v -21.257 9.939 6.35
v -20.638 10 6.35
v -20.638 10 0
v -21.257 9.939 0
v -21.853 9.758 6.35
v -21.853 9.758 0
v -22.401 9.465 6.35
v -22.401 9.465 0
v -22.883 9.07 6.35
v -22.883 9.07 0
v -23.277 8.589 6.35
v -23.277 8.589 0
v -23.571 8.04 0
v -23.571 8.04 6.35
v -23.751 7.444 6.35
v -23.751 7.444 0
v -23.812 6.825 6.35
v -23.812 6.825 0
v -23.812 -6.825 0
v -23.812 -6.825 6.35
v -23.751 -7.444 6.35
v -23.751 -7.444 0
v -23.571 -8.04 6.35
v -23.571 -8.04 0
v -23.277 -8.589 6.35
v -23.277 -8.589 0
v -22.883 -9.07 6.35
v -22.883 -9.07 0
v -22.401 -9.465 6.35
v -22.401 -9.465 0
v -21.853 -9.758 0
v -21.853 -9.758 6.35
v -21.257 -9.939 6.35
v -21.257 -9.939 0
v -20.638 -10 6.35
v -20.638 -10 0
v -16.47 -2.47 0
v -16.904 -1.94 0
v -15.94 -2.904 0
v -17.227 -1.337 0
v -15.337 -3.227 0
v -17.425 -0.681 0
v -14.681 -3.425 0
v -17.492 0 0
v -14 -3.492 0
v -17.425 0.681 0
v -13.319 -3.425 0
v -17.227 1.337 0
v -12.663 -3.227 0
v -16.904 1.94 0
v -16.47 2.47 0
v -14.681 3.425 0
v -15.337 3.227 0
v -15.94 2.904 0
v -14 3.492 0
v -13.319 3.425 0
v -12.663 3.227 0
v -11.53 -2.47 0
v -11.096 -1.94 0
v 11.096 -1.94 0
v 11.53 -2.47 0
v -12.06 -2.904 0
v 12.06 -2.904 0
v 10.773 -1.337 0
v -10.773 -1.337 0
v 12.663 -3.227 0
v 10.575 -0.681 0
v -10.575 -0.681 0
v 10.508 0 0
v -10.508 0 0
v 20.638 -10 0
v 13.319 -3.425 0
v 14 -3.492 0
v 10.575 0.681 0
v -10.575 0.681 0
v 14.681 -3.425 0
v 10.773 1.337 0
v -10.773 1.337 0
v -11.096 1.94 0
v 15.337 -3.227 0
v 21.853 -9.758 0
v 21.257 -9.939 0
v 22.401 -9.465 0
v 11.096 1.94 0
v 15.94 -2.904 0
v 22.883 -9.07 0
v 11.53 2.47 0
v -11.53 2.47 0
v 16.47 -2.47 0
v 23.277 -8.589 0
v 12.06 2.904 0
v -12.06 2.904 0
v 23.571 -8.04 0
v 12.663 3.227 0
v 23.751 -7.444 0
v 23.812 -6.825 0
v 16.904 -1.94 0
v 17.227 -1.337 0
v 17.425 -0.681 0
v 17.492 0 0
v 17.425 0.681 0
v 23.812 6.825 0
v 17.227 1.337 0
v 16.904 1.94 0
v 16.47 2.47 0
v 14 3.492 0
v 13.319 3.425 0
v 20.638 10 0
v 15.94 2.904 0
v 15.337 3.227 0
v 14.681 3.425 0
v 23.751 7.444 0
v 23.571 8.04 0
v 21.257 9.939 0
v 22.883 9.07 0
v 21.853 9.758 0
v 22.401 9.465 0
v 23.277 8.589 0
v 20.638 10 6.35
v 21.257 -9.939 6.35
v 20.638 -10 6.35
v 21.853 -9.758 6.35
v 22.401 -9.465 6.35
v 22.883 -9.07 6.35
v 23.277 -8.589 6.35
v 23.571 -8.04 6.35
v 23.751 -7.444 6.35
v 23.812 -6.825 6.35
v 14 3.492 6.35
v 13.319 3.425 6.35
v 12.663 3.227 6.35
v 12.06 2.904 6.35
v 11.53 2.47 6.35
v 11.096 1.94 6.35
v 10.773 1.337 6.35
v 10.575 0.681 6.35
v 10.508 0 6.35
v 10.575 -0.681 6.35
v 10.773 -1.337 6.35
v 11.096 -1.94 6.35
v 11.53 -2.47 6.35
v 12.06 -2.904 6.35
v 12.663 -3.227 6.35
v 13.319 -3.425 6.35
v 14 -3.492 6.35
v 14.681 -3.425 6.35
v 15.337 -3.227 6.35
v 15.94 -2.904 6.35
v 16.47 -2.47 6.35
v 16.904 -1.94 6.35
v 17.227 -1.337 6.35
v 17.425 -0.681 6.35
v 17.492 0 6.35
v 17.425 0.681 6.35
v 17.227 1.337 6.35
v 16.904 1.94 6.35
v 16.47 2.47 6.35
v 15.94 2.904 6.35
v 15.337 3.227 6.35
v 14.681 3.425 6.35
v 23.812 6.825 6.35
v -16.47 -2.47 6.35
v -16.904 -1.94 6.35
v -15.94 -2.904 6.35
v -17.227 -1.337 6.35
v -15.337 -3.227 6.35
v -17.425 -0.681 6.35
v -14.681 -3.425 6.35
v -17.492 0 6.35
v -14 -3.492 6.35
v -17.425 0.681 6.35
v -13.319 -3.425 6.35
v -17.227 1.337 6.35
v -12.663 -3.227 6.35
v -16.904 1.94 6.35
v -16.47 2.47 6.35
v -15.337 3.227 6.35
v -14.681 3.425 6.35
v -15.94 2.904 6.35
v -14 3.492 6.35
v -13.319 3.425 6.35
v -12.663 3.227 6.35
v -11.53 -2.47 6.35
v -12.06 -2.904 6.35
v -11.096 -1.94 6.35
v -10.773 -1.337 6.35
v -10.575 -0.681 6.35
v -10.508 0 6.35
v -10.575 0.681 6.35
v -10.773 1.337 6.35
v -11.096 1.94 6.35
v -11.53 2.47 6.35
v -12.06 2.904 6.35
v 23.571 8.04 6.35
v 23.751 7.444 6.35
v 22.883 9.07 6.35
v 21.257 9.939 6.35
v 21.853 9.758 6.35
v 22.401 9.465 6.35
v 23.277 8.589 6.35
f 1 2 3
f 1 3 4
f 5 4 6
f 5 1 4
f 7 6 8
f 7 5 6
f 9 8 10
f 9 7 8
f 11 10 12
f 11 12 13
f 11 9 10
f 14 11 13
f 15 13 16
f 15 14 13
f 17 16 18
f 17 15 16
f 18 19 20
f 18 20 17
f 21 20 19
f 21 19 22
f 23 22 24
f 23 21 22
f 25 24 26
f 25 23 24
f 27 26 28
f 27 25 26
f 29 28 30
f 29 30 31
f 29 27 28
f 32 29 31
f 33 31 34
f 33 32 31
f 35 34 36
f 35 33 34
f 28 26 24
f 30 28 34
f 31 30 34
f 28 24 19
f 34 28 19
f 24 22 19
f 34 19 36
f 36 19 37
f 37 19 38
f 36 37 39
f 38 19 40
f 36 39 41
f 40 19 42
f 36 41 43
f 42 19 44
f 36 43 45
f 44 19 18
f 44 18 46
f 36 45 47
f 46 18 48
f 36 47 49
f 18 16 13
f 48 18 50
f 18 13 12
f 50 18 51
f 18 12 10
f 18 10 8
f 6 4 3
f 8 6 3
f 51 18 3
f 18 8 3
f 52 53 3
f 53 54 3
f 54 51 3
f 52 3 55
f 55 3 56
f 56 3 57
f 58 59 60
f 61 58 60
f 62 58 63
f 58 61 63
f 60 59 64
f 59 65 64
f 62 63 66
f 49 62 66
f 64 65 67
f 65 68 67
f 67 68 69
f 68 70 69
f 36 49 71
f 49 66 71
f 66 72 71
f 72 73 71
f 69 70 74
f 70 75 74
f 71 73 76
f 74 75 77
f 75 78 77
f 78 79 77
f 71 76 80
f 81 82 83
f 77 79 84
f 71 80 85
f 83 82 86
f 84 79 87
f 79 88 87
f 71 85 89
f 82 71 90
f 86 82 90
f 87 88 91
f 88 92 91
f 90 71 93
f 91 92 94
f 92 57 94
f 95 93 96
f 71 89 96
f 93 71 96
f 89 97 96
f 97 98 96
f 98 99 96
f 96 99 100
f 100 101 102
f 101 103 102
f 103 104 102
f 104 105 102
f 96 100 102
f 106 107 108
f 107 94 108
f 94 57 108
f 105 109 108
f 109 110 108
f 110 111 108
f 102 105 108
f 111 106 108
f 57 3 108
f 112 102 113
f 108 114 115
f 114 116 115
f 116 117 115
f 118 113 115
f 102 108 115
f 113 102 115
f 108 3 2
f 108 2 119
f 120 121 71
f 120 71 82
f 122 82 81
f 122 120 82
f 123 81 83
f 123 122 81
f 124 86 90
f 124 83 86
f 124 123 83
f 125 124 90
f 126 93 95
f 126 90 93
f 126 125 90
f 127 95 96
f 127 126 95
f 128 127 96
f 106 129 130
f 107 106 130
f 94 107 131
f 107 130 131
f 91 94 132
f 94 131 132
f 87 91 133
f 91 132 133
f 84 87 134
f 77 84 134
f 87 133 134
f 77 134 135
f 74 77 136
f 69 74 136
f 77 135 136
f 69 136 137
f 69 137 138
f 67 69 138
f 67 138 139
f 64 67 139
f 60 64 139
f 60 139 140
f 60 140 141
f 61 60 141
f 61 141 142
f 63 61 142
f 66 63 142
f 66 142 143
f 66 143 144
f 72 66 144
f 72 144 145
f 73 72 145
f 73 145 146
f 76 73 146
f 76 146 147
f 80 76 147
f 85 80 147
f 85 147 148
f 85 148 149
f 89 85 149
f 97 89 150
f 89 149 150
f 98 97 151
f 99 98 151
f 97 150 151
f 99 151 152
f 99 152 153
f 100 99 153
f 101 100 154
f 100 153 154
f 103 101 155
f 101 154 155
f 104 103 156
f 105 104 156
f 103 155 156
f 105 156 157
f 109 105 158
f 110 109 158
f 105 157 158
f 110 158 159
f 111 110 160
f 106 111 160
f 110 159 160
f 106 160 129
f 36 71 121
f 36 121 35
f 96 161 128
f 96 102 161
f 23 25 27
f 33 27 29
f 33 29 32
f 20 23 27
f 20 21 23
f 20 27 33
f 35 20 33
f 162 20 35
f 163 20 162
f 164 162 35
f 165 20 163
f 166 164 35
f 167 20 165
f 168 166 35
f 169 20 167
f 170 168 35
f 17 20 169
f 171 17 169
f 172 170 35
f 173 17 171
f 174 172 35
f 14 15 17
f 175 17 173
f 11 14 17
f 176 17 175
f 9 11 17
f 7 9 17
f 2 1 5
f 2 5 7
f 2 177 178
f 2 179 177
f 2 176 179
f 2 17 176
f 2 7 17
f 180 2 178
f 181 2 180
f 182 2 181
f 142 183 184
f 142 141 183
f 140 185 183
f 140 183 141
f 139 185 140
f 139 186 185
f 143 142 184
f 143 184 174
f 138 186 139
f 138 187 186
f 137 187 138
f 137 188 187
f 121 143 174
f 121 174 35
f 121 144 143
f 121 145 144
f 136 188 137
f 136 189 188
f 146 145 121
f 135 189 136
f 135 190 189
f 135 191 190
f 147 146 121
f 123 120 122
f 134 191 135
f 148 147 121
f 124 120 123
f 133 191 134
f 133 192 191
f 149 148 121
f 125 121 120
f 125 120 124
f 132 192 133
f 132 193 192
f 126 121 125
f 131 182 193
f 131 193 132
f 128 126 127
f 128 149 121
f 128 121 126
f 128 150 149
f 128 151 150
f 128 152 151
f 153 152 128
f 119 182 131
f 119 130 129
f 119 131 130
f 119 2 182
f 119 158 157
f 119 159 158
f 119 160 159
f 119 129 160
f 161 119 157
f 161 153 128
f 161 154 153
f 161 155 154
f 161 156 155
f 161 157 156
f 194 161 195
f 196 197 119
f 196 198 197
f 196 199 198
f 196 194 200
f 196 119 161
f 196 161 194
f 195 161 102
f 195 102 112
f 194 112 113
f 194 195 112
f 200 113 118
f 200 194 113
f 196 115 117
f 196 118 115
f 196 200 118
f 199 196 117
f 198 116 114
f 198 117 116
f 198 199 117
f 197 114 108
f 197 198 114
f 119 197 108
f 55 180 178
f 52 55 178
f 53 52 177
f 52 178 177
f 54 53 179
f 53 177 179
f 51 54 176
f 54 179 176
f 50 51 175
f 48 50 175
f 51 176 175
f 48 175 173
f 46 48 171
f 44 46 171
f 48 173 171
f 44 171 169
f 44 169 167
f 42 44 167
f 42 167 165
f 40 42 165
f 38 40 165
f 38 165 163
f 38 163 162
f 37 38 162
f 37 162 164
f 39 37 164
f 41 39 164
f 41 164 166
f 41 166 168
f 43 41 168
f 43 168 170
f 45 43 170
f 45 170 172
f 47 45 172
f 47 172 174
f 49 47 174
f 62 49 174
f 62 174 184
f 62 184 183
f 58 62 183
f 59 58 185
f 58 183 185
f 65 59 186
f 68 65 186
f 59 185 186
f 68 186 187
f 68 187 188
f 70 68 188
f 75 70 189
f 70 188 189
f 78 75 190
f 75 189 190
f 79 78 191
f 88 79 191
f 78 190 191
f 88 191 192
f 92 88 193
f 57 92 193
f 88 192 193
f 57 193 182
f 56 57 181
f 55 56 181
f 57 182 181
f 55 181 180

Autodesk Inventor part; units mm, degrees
ref_plane "YZ Plane" through (0, 0, 0) normal (1, 0, 0) x (0, 1, 0)
ref_plane "XZ Plane" through (0, 0, 0) normal (0, 1, 0) x (-1, 0, 0)
ref_plane "XY Plane" through (0, 0, 0) normal (0, 0, 1) x (1, 0, 0)
sketch "Sketch1" plane through (0, 0, 0) normal (0, 0, 1) x (1, 0, 0)
  line L0 (0, 14) -> (0, -14) projected
  line L1 (-33.3375, 0) -> (33.3375, 0) projected
  line L2 (23.8125, -10) -> (-23.8125, -10)
  line L3 (-23.8125, -10) -> (-23.8125, 10)
  line L4 (-23.8125, 10) -> (23.8125, 10)
  line L5 (23.8125, 10) -> (23.8125, -10)
  line L6 (23.8125, -10) -> (-23.8125, 10) construction
  line L7 (-23.8125, -10) -> (23.8125, 10) construction
  point P0 (0, 0)
  point P1 (-14, 0)
  point P2 (14, 0)
  dimension "d0" = 47.625
  dimension "d1" = 14
  dimension "d2" = 14
  dimension "d3" = 20
extrude "Extrusion1" add sketch "Sketch1" along normal blind 6.35
hole "Hole1" at (-14, 0, 0) at (14, 0, 0) direction (0, 0, 1) diameter 6.985 end through all
fillet "Fillet1" radius 3.175 4 edges at (23.8125, 10, 3.175) (23.8125, -10, 3.175) (-23.8125, -10, 3.175) (-23.8125, 10, 3.175)
